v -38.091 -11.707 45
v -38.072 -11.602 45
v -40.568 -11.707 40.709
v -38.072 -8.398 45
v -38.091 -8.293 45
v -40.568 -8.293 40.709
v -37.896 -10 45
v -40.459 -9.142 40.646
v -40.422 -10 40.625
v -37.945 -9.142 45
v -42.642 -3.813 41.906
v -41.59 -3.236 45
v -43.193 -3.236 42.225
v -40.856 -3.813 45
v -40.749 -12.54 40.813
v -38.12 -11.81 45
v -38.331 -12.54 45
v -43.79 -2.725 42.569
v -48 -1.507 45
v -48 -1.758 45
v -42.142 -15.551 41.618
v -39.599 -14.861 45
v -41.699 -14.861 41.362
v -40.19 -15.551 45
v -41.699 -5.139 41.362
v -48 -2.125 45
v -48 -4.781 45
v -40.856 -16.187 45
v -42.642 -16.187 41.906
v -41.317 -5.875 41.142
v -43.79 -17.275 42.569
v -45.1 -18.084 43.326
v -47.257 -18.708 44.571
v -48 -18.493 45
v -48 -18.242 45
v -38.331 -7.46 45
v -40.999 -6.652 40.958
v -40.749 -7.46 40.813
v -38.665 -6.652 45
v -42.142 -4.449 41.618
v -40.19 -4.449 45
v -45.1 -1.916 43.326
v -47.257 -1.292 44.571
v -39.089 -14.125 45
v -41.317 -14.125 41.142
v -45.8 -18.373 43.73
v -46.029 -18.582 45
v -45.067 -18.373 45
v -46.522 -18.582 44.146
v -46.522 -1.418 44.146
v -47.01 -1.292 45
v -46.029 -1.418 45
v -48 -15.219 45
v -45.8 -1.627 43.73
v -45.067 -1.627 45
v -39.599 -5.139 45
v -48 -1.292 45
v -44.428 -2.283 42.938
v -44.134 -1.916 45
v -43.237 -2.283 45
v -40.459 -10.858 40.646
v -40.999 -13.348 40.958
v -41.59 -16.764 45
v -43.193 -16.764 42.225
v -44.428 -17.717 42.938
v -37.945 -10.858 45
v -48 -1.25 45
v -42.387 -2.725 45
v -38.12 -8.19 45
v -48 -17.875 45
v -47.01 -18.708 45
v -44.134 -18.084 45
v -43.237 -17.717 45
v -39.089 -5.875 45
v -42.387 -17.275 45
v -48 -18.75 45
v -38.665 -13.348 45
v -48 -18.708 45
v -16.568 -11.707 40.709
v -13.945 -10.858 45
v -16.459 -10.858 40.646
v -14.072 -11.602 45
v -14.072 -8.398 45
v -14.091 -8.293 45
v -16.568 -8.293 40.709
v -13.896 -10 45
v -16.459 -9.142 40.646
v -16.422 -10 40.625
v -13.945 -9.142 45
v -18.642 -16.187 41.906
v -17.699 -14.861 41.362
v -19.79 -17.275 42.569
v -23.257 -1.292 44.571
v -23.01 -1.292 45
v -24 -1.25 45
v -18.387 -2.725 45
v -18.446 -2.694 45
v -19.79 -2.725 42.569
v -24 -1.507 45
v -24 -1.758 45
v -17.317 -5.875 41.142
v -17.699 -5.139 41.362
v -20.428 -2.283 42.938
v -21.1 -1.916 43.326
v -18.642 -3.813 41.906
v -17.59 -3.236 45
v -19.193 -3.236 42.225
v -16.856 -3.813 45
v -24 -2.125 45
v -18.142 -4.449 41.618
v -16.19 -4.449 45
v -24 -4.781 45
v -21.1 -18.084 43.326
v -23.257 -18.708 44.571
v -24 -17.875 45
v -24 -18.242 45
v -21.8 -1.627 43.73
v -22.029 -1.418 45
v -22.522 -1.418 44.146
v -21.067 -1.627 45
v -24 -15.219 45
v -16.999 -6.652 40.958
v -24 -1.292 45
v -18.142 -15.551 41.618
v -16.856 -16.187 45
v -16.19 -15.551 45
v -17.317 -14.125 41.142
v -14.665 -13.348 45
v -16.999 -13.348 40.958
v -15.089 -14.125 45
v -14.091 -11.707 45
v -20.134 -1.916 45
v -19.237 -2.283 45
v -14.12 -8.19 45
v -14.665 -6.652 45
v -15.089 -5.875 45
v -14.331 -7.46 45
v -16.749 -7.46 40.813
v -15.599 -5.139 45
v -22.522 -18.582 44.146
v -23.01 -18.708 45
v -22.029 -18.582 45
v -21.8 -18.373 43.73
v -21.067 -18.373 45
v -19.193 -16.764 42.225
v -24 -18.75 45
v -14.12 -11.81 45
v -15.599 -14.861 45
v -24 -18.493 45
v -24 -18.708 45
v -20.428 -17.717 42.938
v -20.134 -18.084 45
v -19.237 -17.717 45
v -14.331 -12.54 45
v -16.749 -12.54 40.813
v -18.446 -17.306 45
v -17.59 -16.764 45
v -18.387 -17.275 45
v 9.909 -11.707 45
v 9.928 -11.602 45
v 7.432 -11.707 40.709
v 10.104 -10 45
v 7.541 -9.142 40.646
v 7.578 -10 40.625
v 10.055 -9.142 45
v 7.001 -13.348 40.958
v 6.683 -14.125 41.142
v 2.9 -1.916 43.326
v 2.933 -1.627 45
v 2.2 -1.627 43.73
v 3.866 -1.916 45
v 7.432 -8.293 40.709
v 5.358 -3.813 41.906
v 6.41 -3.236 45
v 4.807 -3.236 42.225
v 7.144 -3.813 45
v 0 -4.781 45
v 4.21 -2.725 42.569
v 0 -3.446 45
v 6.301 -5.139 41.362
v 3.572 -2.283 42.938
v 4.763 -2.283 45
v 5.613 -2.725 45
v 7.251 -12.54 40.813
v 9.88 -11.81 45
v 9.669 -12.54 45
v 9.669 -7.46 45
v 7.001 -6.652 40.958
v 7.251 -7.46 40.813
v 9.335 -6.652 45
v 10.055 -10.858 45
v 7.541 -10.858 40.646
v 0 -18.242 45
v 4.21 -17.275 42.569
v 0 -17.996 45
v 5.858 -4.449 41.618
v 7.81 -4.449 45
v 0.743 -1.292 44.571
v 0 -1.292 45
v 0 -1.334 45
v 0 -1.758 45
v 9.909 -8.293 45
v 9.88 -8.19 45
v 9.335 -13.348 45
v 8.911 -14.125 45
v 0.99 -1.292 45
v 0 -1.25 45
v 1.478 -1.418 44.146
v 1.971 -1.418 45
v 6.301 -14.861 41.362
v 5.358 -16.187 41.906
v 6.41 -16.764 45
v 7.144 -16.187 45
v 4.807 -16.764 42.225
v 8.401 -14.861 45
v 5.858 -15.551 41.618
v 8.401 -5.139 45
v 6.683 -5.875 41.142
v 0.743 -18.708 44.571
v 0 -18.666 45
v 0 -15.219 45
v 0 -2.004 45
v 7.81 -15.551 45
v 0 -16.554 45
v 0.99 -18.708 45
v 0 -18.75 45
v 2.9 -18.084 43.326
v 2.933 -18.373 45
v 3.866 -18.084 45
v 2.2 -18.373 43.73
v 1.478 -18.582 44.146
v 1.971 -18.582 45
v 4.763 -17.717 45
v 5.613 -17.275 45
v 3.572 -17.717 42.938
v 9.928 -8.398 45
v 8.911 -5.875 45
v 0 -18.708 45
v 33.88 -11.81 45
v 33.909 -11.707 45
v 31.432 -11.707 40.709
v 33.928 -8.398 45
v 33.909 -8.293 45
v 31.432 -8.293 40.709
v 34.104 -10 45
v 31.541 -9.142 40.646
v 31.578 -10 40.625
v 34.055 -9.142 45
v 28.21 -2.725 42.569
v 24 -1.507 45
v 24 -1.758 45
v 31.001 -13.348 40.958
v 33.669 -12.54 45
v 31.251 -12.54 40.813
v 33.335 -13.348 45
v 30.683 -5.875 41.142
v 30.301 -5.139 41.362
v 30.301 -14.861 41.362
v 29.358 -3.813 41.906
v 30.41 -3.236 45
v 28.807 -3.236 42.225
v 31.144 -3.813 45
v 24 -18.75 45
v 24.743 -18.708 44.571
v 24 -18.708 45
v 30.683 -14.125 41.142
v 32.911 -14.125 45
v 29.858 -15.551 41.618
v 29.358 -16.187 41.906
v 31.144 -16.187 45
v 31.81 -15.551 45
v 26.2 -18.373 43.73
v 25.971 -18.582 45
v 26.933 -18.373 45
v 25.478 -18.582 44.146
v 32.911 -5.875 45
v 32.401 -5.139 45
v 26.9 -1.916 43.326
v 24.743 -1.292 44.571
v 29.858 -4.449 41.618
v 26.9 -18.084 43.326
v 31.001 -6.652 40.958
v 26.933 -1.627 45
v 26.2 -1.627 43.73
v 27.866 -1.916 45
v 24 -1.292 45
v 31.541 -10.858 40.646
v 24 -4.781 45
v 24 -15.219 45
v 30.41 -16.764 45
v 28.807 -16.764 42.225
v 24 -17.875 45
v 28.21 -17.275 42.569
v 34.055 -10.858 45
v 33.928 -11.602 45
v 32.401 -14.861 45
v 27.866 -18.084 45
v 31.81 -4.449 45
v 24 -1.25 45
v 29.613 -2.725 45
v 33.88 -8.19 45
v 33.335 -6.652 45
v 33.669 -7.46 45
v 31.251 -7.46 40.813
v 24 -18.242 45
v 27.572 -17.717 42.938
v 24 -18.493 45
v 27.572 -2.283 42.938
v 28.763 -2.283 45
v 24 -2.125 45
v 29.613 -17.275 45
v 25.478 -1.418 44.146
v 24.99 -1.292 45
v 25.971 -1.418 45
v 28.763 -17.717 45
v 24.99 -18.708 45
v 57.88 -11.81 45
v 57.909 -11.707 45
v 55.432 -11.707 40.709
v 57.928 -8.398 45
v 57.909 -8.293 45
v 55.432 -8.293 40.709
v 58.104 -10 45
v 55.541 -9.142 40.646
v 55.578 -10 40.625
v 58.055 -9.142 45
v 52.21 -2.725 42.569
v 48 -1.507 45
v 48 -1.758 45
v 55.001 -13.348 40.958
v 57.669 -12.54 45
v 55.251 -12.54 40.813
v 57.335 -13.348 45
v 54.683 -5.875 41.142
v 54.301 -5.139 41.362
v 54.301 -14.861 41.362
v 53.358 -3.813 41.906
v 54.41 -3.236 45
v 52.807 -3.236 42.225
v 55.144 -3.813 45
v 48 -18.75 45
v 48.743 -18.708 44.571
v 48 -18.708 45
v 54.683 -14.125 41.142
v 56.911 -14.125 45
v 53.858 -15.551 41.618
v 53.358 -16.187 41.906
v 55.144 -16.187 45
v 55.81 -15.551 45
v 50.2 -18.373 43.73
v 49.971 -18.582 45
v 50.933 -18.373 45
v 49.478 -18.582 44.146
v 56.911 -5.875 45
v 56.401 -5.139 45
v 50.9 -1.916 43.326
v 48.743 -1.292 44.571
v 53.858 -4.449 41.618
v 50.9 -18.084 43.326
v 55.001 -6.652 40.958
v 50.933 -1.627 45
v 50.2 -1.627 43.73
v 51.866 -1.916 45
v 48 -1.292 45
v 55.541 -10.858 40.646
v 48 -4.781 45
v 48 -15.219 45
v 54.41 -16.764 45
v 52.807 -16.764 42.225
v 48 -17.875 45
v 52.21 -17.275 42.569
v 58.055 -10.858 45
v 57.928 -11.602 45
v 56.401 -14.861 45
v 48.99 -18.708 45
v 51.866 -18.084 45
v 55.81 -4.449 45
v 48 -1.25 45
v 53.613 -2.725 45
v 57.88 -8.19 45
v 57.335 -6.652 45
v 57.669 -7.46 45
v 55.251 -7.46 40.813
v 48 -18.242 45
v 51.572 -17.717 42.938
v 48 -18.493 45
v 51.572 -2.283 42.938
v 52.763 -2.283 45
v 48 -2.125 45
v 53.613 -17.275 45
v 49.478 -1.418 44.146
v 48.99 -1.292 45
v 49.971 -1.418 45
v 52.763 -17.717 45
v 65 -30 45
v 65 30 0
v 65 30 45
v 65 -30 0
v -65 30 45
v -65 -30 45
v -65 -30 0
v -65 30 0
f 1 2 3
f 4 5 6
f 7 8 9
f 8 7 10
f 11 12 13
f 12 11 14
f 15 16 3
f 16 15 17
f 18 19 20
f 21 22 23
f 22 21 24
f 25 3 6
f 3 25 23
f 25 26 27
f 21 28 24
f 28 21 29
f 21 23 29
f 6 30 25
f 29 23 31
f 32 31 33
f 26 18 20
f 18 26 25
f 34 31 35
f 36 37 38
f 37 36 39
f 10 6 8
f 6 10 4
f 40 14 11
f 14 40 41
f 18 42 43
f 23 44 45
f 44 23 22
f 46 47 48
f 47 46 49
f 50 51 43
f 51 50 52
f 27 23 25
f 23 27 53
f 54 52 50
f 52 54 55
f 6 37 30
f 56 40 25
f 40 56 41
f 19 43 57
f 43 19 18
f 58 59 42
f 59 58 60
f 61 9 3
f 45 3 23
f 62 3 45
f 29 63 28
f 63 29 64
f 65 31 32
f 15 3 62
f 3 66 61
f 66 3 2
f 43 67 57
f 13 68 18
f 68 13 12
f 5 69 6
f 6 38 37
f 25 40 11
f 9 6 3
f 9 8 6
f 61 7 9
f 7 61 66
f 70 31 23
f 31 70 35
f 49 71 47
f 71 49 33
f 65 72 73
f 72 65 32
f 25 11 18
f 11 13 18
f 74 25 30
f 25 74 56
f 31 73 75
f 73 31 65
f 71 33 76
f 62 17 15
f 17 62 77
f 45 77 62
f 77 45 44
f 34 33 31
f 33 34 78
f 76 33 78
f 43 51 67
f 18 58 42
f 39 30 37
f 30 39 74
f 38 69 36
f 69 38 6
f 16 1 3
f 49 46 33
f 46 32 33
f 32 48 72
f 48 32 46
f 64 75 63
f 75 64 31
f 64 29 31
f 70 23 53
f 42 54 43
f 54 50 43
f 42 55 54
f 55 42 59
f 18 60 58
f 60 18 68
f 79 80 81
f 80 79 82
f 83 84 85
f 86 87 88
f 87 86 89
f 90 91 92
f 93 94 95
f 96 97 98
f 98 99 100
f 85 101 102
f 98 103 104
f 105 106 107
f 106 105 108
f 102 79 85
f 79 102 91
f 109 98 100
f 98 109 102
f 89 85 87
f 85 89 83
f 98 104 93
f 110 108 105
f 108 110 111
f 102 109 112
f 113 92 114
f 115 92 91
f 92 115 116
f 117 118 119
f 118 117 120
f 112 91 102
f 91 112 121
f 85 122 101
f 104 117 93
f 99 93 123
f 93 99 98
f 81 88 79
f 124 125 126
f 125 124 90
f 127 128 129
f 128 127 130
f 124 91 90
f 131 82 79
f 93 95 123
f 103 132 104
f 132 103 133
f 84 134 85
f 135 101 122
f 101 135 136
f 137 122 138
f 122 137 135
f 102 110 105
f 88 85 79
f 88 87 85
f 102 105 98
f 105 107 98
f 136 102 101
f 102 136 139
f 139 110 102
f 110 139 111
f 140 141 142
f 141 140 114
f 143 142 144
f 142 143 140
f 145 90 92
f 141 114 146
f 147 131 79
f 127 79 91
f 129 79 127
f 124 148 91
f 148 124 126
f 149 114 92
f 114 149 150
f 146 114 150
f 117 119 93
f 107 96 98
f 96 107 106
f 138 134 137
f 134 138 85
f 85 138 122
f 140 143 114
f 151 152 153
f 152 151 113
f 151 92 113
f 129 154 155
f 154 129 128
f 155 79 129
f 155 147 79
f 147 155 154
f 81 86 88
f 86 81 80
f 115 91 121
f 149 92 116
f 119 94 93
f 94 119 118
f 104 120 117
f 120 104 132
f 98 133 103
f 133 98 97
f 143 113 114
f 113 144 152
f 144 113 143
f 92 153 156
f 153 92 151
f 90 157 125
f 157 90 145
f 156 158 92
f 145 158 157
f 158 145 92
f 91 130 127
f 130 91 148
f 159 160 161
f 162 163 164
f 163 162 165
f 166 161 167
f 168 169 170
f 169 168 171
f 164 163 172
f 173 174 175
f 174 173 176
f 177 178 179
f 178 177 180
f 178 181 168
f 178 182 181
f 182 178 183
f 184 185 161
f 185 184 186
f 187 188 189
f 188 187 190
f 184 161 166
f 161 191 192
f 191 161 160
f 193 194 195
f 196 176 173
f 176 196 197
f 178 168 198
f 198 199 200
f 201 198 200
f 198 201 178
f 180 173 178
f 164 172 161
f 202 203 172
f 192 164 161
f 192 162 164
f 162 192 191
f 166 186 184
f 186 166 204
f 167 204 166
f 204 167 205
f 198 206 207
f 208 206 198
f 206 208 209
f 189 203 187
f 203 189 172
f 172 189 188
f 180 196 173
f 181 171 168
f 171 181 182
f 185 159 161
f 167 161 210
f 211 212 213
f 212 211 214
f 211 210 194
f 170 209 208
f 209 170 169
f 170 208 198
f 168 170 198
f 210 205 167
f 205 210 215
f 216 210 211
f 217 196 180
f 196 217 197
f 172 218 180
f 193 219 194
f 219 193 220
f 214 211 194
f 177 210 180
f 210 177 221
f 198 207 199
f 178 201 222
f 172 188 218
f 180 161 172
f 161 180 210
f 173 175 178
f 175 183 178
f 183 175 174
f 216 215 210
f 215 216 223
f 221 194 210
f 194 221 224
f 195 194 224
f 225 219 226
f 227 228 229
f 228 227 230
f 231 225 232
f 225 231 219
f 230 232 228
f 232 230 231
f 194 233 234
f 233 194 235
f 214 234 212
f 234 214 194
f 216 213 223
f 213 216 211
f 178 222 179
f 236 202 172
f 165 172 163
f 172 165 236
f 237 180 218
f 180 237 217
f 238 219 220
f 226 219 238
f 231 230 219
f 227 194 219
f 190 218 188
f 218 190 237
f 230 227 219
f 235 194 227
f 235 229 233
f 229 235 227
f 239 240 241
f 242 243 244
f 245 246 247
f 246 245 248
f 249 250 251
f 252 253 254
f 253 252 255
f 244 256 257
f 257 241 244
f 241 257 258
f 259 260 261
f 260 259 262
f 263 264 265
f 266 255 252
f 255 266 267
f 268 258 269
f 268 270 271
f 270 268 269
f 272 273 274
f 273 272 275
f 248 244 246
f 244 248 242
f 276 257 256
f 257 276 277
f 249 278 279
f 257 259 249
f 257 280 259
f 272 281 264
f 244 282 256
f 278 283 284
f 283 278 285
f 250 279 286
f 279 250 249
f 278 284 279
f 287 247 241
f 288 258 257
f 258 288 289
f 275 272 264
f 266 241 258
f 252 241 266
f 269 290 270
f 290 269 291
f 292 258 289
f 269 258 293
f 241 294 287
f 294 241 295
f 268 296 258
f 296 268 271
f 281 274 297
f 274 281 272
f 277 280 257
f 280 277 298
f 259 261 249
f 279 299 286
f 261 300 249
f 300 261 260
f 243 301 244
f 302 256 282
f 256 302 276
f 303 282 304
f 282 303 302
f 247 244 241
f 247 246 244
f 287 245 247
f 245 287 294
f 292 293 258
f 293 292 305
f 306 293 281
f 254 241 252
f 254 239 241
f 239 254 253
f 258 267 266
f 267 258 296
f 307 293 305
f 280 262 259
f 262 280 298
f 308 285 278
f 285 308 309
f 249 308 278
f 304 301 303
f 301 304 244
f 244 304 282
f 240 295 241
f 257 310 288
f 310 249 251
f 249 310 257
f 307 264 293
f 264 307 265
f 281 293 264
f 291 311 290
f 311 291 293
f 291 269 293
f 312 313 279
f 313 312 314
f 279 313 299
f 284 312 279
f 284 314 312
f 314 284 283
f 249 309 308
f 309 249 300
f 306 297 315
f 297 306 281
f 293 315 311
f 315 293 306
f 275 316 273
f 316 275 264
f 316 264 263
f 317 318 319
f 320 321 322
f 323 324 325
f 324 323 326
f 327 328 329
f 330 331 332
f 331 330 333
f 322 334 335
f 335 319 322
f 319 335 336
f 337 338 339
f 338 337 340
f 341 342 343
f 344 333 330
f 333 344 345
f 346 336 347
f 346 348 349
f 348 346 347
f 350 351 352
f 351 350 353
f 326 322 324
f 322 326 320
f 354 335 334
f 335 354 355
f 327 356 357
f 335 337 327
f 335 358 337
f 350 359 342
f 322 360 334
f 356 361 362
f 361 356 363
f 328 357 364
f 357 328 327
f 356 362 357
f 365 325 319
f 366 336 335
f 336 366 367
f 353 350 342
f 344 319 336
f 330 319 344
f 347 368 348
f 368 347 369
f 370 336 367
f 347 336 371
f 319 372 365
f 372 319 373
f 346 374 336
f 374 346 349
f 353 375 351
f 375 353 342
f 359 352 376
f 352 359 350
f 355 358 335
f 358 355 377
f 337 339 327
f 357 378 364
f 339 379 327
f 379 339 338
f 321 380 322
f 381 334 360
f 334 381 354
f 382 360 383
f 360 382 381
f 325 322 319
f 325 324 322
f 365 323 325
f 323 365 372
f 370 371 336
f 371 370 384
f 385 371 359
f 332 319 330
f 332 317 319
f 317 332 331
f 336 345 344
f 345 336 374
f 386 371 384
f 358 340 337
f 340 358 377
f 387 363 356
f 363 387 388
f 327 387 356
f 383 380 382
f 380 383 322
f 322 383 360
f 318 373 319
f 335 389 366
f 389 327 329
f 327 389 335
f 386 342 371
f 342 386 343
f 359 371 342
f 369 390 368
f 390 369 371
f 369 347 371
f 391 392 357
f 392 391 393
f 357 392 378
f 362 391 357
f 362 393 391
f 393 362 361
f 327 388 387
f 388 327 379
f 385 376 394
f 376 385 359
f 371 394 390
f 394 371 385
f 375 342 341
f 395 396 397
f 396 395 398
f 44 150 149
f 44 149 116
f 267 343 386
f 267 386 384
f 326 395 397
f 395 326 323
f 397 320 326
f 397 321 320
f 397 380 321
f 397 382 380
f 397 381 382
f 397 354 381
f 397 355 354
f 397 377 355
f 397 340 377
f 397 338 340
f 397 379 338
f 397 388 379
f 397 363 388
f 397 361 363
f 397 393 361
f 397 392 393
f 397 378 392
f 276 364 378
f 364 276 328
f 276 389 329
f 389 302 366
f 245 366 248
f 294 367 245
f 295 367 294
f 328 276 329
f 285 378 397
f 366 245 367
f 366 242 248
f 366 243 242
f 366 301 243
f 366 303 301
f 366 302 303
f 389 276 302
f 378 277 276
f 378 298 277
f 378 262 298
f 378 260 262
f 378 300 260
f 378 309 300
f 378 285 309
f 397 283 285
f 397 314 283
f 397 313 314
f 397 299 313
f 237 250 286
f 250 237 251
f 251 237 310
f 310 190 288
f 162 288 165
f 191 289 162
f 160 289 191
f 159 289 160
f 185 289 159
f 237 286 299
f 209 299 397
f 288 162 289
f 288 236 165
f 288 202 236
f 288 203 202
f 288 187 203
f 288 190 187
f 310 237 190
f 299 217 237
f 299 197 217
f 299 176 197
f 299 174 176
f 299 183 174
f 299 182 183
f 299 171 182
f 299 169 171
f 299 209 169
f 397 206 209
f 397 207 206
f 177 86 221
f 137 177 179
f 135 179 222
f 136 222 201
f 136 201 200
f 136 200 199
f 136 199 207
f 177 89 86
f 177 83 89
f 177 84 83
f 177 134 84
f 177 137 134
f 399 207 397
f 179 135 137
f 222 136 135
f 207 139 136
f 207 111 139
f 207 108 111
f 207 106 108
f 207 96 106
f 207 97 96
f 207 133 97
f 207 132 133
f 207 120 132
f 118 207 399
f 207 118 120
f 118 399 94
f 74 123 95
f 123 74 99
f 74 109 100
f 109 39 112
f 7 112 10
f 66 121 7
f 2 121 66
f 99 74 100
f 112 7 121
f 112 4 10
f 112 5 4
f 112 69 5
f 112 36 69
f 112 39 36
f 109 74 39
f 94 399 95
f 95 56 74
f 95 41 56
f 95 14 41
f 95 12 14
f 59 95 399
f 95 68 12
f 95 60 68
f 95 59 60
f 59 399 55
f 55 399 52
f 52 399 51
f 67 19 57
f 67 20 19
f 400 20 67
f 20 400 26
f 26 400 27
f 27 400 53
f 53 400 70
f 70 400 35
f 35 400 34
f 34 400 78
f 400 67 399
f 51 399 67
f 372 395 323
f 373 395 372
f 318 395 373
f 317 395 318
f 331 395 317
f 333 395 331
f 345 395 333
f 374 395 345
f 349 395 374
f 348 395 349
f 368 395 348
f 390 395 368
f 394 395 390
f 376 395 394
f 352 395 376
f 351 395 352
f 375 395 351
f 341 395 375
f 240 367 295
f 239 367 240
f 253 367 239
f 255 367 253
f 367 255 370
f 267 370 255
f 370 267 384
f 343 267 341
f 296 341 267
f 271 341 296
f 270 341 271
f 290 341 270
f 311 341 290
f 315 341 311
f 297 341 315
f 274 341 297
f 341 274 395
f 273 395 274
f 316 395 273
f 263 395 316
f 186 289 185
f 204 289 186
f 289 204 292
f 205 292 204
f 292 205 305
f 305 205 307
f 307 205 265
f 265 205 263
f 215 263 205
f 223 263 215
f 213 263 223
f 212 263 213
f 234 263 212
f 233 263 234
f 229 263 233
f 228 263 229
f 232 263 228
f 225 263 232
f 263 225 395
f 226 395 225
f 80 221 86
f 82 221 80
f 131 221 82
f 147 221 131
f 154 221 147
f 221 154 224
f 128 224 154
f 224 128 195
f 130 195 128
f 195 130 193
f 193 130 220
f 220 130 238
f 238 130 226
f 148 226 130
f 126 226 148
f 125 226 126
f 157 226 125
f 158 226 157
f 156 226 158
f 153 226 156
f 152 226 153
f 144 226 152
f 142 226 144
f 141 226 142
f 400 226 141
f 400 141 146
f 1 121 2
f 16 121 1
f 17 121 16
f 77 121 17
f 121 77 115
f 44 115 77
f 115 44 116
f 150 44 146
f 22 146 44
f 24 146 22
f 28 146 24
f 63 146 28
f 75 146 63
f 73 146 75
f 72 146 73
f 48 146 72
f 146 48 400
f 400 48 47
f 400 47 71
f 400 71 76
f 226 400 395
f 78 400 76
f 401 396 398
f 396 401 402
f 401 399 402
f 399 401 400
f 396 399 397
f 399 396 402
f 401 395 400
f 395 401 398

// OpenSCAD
// 15mL Conical Tube Rack
// Designed for volume reading and pipetting.
// Features 5 tilted holes at 30 degrees from vertical.

// --- Dimensions ---
L = 130;             // Length of block (X)
W = 60;              // Depth of block (Y)
H = 45;              // Height of block (Z)

num_holes = 5;       // Number of tube holes
spacing = 24;        // Spacing between hole centers (X)
hole_d = 17.5;       // Diameter of the holes
hole_depth = 40;     // Depth of the holes along their axis

tilt_angle = 30;     // Tilt angle from vertical (Z-axis)
entry_y = -10;       // Y-coordinate where the hole axis meets the top face

$fn = 64;

// --- Calculations ---
// X positions for the holes, centered on the block
// For 5 holes with 24mm spacing: -48, -24, 0, 24, 48
hole_x_positions = [for (i = [0 : num_holes - 1]) (i - (num_holes - 1) / 2) * spacing];

// --- Main Construction ---

difference() {
    // The main block
    // Centered on X and Y, sits on Z=0.
    translate([-L/2, -W/2, 0])
    cube([L, W, H]);

    // The holes
    for (x_pos = hole_x_positions) {
        // To ensure the axis meets the top face at (x_pos, entry_y, H):
        // 1. We translate to the entry point (x_pos, entry_y, H).
        // 2. We rotate the coordinate system so the Z-axis tilts 30 degrees towards +Y.
        //    Rotating around X by 30 degrees makes the new Z-axis [0, sin(30), -cos(30)].
        //    This vector points "down and forward" into the block.
        // 3. We create a cylinder starting at the origin (the entry point) 
        //    extending along this new Z-axis.
        
        translate([x_pos, entry_y, H])
        rotate([0, tilt_angle, 0])
        // We use a small epsilon (0.01) to ensure the cylinder cuts through the top face
        cylinder(h = hole_depth + 0.01, d = hole_d);
    }
}
